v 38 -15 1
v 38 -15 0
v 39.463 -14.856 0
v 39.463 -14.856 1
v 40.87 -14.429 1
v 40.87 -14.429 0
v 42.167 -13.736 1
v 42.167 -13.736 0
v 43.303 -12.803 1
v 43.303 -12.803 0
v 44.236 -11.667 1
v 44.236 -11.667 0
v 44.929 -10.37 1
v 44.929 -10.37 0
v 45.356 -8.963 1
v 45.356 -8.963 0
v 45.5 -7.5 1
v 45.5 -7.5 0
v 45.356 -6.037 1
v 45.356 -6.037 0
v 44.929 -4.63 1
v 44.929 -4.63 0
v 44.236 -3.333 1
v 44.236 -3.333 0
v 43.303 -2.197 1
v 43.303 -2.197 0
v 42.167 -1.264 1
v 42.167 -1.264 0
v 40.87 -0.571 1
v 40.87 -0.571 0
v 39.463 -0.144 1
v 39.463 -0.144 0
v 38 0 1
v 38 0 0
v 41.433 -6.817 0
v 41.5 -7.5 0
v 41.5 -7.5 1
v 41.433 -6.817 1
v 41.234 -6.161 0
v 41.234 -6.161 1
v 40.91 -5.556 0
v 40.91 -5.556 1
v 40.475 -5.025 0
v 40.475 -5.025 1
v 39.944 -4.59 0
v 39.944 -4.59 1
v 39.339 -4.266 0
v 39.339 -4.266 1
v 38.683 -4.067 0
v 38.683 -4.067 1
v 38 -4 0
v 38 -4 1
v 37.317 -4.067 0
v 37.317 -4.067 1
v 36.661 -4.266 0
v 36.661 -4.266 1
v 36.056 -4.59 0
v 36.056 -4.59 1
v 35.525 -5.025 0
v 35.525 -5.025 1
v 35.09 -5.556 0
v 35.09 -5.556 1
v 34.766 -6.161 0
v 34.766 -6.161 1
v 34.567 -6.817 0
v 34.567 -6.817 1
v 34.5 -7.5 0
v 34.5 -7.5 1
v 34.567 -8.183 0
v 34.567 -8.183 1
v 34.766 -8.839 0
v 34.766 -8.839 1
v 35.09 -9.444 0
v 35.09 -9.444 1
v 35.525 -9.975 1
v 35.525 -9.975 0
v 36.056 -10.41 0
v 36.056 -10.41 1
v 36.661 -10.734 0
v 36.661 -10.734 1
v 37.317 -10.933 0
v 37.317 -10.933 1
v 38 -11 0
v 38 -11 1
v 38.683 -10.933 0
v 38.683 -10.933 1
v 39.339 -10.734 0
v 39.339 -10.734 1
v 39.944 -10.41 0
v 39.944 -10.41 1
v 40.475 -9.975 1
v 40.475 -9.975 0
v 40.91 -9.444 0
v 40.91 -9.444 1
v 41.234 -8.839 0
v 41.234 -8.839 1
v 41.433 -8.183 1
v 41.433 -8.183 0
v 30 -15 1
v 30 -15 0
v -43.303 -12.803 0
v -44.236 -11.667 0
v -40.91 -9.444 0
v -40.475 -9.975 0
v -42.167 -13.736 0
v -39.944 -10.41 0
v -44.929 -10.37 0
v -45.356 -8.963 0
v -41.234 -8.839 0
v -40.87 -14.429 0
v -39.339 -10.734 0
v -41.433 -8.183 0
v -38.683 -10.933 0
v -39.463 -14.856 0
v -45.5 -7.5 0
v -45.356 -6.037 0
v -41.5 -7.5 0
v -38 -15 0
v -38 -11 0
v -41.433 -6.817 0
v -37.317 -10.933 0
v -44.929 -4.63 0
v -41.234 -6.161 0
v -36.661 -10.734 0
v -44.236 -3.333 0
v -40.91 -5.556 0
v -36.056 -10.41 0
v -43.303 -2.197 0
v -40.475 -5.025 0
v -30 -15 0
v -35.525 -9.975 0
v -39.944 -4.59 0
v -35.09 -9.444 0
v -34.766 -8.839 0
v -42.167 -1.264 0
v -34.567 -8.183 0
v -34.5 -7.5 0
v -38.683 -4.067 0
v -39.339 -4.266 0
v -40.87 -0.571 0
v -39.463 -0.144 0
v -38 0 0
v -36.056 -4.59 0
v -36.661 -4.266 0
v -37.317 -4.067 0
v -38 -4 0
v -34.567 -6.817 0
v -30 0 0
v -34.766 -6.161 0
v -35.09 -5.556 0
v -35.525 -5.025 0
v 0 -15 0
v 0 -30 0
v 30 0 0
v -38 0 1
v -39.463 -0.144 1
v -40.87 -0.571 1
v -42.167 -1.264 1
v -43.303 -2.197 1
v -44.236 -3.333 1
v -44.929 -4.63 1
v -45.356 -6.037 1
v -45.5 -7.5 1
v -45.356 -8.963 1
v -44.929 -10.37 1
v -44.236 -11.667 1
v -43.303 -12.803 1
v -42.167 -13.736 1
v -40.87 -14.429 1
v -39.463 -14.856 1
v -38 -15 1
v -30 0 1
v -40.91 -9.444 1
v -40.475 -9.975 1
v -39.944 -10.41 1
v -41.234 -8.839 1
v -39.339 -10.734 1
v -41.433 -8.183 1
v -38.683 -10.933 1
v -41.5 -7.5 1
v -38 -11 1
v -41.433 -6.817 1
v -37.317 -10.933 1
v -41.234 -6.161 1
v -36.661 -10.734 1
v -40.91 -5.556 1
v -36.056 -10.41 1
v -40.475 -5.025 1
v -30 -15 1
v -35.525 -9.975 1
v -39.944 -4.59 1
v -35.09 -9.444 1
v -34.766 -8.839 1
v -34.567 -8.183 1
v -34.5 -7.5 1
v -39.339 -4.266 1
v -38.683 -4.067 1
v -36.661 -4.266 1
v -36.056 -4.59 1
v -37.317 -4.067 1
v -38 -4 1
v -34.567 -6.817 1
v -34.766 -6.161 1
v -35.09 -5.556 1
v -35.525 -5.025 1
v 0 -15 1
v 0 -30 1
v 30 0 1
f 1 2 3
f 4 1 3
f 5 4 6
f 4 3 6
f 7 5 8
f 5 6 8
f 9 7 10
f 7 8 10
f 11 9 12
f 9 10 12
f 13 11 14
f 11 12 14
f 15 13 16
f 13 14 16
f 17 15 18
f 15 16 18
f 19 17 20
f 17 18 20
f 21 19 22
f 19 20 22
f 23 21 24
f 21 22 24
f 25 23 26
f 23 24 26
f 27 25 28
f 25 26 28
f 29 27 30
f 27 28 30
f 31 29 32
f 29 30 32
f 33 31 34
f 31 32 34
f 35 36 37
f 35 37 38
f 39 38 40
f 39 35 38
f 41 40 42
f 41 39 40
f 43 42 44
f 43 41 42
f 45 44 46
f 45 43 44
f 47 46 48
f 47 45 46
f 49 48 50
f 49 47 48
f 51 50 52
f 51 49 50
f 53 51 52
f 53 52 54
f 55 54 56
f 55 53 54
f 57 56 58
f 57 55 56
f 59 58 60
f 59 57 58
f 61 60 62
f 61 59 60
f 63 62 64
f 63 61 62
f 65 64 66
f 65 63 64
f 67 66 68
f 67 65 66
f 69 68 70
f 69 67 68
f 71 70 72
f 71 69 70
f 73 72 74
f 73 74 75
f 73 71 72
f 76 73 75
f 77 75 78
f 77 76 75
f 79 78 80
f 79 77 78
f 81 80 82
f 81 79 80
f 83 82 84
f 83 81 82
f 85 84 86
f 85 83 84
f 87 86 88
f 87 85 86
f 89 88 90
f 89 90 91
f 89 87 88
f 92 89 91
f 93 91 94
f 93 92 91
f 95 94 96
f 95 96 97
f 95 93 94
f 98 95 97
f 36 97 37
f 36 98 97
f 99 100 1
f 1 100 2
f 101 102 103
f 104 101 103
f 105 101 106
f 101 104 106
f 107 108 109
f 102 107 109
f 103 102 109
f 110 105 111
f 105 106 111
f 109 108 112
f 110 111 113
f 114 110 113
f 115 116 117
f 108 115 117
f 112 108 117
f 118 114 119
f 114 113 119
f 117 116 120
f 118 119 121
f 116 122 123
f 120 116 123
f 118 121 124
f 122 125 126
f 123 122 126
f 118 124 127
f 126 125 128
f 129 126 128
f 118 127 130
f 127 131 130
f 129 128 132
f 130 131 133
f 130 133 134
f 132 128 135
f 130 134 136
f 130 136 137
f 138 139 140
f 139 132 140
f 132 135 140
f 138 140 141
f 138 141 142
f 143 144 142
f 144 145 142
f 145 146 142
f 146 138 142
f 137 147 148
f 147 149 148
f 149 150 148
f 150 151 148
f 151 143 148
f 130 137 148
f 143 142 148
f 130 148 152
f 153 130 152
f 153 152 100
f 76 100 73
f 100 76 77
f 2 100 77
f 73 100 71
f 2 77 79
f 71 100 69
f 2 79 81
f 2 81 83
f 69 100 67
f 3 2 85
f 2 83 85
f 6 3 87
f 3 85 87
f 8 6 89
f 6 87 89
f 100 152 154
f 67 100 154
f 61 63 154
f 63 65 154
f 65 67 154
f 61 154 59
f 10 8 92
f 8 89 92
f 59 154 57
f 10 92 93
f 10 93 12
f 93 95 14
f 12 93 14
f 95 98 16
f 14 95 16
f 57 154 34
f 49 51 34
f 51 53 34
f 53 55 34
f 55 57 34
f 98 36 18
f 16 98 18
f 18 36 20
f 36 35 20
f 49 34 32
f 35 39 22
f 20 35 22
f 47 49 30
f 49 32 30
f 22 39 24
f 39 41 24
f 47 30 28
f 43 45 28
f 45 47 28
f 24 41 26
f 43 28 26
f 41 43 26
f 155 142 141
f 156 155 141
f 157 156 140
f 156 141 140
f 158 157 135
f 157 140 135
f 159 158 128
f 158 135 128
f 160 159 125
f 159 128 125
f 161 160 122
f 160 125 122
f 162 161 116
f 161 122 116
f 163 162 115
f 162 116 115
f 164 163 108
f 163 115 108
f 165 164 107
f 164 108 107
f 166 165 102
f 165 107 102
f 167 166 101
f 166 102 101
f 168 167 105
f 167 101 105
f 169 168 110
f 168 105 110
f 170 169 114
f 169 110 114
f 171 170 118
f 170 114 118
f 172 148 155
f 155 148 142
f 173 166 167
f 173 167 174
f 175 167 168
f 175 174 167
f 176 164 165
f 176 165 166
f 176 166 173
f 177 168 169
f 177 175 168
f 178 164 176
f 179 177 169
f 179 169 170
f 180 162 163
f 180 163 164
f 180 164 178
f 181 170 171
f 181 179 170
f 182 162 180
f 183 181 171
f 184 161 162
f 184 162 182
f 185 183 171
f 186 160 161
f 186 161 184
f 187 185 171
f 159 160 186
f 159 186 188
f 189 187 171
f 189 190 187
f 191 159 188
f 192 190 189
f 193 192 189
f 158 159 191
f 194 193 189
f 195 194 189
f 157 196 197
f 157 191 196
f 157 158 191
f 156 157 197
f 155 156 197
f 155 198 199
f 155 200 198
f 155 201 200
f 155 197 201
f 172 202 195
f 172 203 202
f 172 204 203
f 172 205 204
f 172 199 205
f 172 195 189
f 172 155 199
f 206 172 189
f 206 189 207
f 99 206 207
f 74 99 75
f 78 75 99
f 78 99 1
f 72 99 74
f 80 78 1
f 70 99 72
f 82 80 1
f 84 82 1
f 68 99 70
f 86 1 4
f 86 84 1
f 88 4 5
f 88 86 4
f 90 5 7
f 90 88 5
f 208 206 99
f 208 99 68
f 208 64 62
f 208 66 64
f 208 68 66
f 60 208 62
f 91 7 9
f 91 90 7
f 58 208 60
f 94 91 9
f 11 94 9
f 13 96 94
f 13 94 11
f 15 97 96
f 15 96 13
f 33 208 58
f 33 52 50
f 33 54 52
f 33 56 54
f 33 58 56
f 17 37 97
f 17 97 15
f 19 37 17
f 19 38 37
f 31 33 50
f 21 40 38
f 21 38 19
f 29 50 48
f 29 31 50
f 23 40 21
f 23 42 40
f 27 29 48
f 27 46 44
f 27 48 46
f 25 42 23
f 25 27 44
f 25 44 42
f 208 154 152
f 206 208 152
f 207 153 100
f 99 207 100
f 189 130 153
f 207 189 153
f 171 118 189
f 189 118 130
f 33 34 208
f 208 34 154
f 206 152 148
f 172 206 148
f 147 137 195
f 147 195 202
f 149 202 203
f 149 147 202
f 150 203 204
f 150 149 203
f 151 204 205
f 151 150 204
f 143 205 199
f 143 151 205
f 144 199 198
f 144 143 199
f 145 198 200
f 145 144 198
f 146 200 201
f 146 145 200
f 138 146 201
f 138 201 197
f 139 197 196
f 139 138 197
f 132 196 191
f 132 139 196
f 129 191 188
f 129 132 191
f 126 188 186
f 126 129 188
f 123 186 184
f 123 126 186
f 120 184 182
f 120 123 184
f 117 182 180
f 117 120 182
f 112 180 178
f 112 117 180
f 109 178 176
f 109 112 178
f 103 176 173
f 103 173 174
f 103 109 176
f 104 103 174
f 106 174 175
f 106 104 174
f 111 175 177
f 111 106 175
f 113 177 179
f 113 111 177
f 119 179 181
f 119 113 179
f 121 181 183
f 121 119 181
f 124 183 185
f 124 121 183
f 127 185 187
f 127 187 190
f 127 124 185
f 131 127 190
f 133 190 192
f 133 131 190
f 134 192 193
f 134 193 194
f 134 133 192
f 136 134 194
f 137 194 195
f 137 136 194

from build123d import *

# Parameters (mm, degrees)
F0_R     = 3.5
F1_DEPTH = 1


with BuildPart() as f1:
    # F0 (on Top) → F1 (new body)
    with BuildSketch(Plane.XY):
        Polygon((0, -15), (-30, 0), (-30, -15), (0, -30), align=None)
        Polygon((30, 0), (0, -15), (0, -30), (30, -15), align=None)
        with BuildLine():
            Line((38, 0), (30, 0))
            Line((30, 0), (30, -15))
            Line((30, -15), (38, -15))
            ThreePointArc((38, -15), (45.5, -7.5), (38, 0))
        make_face()
        with Locations((38, -7.5)):
            Circle(F0_R, mode=Mode.SUBTRACT)
        with BuildLine():
            Line((-30, -15), (-30, 0))
            Line((-30, 0), (-38, 0))
            ThreePointArc((-38, 0), (-45.5, -7.5), (-38, -15))
            Line((-38, -15), (-30, -15))
        make_face()
        with Locations((-38, -7.5)):
            Circle(F0_R, mode=Mode.SUBTRACT)
    extrude(amount=F1_DEPTH)


solid = f1.part
